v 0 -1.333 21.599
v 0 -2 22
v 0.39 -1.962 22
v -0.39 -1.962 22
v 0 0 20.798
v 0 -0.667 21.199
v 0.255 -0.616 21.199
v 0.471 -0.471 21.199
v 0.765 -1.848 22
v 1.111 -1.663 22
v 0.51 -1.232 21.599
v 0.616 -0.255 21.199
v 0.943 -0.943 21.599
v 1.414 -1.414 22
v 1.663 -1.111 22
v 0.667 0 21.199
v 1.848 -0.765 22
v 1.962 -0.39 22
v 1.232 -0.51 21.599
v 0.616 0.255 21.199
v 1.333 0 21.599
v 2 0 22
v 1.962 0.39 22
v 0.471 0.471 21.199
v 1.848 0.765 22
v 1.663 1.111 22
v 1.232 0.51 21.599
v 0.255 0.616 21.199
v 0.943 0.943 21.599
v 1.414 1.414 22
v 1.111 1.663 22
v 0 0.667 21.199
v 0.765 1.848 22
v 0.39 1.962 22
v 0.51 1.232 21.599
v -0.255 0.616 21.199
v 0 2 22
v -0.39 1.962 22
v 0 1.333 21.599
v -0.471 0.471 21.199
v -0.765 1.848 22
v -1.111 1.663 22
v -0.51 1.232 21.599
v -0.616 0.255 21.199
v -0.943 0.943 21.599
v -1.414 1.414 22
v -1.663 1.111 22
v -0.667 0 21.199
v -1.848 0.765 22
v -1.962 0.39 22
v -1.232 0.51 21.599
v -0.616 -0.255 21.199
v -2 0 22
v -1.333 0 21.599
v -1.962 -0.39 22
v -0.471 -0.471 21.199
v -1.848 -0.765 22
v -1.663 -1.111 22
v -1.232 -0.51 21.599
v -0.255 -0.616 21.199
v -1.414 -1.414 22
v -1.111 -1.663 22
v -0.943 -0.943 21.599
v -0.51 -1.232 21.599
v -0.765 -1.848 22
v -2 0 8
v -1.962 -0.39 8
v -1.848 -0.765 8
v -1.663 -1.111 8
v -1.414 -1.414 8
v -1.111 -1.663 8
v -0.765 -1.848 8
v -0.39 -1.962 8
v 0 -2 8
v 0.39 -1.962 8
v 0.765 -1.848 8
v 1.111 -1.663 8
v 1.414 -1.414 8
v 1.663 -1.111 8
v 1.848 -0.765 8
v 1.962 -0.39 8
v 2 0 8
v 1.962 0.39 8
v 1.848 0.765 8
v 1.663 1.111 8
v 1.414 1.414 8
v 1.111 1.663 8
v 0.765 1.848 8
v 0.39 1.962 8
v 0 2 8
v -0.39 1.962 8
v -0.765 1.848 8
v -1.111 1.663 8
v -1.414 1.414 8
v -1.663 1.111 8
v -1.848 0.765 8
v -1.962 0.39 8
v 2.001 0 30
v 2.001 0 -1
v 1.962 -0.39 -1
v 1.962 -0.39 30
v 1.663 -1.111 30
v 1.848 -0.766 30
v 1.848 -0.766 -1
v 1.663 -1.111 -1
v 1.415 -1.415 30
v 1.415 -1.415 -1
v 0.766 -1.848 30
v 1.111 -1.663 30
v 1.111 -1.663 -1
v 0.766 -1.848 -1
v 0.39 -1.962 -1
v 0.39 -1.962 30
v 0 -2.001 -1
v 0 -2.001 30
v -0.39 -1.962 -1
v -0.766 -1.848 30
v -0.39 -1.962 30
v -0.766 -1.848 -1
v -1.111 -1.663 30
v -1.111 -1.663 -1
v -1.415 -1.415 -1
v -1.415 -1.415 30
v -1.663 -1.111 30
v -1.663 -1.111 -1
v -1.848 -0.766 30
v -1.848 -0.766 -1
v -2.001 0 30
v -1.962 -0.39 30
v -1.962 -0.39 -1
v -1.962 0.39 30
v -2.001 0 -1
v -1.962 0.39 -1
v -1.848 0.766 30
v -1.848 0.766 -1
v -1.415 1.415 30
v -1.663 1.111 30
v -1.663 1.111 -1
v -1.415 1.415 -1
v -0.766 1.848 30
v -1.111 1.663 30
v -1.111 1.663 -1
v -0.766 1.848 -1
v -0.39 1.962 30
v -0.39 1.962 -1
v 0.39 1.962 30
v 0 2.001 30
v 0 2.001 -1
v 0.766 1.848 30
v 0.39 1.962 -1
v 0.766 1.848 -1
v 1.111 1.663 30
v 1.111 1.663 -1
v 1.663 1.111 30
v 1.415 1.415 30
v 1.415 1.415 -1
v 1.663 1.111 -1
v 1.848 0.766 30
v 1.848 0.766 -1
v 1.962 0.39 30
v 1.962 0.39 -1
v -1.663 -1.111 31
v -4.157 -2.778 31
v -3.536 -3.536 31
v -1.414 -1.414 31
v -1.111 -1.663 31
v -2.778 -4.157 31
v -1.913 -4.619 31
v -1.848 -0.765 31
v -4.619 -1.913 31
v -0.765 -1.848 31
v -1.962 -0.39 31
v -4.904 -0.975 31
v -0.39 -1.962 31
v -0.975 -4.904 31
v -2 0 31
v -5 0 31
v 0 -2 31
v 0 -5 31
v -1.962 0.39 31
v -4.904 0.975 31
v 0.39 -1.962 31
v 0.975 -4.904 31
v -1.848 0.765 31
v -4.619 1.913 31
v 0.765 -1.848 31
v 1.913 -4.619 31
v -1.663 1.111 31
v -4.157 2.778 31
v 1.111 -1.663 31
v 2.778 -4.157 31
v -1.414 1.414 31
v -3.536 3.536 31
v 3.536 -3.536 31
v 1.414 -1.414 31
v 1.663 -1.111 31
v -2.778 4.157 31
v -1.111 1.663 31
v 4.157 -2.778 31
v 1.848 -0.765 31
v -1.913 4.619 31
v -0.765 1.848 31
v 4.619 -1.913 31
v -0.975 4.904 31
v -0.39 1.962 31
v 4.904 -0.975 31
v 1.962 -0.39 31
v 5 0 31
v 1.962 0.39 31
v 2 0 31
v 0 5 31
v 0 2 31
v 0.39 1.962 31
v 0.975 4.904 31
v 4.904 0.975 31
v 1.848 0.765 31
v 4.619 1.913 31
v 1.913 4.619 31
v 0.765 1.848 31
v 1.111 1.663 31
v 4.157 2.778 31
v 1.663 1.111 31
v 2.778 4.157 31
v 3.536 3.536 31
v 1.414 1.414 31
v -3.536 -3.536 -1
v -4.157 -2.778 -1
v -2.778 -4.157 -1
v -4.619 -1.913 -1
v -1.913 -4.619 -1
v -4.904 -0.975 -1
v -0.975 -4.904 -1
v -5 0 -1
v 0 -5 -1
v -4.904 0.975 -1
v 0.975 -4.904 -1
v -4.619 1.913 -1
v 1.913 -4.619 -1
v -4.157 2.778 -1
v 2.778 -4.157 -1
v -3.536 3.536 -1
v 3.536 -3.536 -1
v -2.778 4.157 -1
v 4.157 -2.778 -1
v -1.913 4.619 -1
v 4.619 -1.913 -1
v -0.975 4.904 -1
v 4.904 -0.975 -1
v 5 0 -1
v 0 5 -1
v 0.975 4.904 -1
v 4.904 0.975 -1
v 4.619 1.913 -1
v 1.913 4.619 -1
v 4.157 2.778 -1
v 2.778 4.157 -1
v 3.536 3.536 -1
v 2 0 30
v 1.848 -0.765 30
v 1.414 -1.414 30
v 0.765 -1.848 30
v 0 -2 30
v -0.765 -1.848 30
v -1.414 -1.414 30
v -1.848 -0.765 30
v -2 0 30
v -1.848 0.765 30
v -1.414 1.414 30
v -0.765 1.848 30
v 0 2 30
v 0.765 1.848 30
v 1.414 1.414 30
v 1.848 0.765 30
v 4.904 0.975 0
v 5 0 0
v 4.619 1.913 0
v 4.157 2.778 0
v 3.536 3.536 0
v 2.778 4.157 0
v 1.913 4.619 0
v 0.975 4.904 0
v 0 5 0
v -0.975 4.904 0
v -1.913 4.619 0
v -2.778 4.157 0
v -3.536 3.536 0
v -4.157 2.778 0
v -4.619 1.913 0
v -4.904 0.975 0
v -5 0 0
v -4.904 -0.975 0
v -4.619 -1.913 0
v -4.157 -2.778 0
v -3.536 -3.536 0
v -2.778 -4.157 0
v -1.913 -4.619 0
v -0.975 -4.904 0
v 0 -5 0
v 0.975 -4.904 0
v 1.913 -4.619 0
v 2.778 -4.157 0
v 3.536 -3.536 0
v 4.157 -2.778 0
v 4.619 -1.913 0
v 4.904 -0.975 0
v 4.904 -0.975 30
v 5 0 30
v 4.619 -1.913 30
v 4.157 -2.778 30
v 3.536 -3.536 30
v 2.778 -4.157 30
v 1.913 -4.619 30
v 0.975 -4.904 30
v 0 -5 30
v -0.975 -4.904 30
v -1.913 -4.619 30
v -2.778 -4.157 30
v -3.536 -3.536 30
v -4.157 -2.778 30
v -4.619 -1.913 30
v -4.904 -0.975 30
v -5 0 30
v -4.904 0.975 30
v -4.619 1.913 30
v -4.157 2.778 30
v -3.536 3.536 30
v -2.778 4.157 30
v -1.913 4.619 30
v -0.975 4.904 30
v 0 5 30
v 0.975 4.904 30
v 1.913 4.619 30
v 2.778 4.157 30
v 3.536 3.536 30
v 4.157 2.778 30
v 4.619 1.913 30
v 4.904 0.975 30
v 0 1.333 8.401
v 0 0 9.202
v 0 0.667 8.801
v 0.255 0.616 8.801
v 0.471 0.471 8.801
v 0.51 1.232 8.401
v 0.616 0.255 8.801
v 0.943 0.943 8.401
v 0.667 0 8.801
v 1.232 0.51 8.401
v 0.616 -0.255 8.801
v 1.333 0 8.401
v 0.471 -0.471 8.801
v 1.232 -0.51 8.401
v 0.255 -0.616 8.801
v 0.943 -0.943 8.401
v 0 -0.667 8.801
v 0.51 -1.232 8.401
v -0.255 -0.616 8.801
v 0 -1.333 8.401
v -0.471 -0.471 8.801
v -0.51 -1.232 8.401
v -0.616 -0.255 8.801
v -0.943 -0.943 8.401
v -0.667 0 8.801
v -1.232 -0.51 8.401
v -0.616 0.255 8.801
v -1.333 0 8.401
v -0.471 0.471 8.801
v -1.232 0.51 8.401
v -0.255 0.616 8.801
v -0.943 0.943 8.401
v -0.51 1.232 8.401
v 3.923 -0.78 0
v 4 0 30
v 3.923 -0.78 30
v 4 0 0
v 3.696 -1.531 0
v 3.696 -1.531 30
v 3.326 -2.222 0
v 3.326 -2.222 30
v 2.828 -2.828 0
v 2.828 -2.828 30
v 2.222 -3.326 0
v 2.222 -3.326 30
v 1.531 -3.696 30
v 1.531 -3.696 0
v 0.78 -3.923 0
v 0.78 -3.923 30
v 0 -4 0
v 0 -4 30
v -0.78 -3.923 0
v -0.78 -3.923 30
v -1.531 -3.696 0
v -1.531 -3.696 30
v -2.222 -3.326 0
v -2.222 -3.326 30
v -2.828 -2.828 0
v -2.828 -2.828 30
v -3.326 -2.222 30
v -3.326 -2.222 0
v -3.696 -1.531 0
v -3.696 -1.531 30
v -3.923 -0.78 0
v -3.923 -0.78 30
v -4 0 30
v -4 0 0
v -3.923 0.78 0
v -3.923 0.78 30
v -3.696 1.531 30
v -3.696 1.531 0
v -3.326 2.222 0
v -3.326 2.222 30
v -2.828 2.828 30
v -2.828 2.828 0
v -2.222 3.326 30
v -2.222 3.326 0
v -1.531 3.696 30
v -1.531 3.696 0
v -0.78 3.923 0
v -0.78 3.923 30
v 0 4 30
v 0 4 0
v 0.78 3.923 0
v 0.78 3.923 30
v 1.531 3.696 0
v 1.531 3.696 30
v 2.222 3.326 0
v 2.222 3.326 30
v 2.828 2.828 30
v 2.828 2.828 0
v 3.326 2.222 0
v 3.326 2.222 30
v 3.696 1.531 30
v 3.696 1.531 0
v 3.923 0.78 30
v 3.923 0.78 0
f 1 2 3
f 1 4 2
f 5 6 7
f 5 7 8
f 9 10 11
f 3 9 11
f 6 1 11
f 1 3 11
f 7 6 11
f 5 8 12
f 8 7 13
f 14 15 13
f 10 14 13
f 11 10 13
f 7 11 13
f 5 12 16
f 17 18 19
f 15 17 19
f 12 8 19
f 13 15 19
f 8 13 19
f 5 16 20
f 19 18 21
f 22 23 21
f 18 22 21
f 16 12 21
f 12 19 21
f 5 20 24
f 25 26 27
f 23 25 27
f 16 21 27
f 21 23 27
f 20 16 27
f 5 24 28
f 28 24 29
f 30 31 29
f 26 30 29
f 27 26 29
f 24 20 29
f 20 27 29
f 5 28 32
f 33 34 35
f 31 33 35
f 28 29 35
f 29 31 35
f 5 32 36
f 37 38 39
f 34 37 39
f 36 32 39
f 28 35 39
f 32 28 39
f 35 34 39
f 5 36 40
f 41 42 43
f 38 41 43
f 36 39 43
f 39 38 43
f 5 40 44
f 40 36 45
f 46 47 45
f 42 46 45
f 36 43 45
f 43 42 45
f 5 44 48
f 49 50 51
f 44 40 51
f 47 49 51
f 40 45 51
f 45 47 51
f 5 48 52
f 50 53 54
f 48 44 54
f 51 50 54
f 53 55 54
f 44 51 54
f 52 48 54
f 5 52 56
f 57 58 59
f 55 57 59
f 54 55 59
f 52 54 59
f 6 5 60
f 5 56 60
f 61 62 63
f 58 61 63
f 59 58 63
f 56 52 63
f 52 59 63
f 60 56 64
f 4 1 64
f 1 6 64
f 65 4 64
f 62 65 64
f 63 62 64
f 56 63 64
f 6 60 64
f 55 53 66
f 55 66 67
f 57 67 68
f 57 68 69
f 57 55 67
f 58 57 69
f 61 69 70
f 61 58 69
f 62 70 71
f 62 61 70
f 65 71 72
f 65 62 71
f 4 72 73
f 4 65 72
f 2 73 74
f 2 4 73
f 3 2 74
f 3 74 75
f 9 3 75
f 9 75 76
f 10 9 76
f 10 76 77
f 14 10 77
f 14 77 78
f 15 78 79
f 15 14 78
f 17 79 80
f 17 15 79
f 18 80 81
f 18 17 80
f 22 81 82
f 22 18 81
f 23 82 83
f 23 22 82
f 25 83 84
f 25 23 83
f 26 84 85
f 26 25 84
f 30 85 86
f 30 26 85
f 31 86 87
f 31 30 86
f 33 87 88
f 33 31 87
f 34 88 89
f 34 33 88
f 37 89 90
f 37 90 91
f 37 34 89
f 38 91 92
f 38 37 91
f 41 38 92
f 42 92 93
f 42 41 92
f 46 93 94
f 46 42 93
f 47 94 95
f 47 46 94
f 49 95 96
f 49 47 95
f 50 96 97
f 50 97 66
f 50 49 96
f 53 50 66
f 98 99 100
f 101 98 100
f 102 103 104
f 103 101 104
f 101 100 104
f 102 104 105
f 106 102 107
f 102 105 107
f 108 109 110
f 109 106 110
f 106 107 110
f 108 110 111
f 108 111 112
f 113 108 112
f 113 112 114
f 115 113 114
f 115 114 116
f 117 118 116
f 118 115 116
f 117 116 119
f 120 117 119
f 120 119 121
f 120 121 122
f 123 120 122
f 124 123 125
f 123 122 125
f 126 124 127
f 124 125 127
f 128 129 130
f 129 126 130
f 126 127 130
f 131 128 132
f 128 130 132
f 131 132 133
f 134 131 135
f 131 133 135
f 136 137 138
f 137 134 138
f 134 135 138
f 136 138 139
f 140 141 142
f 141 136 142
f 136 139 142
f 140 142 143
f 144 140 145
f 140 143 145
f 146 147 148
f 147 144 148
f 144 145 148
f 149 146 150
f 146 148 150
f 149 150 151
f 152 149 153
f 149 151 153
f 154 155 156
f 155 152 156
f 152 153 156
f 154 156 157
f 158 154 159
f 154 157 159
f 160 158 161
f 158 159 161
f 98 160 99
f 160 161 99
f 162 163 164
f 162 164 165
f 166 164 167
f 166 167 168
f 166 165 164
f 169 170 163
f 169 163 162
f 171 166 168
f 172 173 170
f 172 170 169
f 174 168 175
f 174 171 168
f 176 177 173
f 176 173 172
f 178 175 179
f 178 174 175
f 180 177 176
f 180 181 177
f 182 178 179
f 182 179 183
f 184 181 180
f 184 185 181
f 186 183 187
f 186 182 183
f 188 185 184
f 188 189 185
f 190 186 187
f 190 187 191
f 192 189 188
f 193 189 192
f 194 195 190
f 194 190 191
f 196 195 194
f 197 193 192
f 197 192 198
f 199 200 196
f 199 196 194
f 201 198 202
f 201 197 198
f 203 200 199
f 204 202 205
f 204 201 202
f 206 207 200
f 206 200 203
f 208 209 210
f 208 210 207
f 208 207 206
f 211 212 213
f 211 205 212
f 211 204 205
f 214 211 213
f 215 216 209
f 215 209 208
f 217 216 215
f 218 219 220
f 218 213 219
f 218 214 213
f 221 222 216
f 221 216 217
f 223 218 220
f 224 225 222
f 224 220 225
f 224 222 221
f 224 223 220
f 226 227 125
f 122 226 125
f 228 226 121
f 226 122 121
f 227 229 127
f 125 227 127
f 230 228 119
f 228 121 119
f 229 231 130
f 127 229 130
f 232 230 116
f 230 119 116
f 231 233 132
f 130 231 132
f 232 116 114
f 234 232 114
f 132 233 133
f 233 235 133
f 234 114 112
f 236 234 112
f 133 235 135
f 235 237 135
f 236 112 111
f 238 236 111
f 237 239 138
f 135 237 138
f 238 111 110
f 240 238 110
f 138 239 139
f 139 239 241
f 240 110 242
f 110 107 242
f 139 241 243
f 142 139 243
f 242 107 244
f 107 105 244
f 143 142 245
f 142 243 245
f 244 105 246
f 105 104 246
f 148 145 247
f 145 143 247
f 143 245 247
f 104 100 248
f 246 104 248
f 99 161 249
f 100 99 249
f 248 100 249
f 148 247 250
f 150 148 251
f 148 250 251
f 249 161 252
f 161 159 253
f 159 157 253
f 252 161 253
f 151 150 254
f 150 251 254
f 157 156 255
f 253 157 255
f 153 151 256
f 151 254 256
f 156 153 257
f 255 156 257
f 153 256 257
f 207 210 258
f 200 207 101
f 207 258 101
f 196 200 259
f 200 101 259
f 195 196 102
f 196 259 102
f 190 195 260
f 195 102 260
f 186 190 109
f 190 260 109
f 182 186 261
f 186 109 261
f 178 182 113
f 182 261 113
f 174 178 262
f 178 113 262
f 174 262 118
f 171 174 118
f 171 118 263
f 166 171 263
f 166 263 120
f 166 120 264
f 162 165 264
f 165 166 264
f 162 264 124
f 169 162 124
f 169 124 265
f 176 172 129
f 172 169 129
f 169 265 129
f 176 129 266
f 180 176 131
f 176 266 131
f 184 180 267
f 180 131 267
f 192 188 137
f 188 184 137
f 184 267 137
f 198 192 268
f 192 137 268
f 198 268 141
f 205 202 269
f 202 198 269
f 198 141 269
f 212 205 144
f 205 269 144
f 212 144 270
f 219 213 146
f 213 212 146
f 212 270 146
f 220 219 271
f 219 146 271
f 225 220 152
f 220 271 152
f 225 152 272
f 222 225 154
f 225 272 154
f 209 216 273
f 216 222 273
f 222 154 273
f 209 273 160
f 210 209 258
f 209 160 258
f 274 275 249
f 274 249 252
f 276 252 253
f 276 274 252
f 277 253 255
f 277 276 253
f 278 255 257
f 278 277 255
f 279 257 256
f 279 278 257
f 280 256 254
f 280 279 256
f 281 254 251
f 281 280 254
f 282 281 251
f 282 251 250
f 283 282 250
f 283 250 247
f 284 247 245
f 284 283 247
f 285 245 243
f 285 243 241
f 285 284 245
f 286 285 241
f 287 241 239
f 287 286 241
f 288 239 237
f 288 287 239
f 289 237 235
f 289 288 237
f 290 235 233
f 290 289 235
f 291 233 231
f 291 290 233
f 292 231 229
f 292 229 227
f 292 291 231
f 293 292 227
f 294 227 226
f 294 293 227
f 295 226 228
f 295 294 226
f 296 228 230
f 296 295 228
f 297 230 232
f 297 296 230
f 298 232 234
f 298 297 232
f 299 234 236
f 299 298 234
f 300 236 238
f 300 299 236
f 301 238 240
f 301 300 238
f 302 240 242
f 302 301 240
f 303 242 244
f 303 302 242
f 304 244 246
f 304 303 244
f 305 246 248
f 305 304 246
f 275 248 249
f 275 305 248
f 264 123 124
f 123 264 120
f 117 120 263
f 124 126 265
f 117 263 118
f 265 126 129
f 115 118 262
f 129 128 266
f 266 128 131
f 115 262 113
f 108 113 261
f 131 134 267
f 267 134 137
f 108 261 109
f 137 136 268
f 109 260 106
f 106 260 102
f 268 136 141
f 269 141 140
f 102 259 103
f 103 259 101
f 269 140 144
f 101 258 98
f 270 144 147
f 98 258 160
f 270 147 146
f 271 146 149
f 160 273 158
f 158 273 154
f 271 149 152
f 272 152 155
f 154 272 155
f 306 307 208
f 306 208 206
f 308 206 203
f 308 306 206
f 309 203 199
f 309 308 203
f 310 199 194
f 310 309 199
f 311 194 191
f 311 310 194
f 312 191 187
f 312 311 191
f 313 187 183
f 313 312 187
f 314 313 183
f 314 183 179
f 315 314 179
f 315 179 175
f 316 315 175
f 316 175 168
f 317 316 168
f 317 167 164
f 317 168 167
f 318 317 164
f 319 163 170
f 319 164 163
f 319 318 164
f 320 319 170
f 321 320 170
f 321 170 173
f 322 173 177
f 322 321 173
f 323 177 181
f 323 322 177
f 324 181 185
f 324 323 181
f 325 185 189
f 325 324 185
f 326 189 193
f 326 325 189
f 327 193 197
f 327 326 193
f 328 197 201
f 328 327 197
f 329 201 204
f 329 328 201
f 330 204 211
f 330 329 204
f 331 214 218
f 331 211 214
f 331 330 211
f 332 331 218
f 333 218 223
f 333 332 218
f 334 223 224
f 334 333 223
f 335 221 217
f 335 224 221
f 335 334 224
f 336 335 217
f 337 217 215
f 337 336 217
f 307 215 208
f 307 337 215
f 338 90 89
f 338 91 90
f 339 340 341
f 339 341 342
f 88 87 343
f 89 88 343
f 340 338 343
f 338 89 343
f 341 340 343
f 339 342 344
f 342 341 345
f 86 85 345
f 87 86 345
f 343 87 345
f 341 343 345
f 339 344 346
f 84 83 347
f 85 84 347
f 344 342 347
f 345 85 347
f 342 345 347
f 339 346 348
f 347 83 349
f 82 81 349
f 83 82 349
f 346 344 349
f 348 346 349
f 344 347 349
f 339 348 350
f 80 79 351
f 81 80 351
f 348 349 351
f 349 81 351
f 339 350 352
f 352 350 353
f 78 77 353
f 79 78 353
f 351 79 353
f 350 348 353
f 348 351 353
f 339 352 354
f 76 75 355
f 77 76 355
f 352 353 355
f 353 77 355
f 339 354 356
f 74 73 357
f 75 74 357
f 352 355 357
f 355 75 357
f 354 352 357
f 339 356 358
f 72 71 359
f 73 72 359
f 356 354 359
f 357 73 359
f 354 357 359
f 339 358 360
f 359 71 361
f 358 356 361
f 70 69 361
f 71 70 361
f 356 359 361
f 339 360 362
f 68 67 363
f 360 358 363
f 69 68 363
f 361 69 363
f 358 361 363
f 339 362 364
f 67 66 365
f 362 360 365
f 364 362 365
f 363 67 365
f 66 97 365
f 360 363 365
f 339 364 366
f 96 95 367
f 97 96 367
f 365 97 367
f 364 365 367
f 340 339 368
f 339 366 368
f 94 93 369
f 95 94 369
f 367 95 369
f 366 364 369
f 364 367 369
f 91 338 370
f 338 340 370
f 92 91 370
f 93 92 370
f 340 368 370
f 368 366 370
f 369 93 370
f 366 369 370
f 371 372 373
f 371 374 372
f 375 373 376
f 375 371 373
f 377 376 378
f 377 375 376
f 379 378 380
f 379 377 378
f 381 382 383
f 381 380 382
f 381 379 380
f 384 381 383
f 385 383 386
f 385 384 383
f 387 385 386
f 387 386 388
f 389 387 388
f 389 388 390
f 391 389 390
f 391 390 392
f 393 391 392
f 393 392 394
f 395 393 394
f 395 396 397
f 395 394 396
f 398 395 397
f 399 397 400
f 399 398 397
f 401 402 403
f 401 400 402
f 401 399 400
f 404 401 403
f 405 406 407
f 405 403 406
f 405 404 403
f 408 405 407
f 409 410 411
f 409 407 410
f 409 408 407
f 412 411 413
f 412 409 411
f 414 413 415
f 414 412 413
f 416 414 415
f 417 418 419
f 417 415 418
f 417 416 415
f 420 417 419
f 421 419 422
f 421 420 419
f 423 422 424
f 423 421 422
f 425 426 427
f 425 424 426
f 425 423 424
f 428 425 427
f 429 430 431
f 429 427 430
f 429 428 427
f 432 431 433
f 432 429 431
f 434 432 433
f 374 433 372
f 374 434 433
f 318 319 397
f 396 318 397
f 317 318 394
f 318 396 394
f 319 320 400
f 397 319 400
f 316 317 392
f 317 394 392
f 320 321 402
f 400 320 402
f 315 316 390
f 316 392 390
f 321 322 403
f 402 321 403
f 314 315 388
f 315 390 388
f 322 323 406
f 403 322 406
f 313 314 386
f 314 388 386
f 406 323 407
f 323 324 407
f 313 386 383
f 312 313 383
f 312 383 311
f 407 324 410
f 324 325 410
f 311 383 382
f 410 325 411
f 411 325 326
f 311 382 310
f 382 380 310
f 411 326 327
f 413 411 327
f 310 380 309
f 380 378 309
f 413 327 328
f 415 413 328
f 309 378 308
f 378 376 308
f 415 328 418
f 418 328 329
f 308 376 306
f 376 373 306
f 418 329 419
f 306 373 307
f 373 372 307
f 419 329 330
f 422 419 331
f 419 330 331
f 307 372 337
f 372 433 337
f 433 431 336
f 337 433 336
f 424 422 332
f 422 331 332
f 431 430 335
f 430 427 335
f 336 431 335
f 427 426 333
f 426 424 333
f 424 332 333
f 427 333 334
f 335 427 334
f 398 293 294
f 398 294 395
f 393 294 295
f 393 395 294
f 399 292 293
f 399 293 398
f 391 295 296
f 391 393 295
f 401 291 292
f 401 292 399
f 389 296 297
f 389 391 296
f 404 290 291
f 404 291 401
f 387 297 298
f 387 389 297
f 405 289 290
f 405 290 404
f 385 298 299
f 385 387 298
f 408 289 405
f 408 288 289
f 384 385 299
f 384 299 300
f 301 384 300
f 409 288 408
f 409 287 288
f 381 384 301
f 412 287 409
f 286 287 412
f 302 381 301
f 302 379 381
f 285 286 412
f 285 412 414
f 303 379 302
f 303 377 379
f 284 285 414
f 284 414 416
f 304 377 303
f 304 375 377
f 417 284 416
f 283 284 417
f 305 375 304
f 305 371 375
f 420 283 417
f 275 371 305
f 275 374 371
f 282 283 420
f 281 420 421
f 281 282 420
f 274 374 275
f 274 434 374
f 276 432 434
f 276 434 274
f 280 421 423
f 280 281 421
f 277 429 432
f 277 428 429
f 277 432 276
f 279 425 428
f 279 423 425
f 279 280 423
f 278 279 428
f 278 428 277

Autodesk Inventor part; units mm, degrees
ref_plane "YZ Plane" through (0, 0, 0) normal (1, 0, 0) x (0, 1, 0)
ref_plane "XZ Plane" through (0, 0, 0) normal (0, 1, 0) x (-1, 0, 0)
ref_plane "XY Plane" through (0, 0, 0) normal (0, 0, 1) x (1, 0, 0)
sketch "スケッチ1" plane through (0, 0, 0) normal (0, 0, 1) x (1, 0, 0)
  circle A0 centre (0, 0) radius 4
  circle A1 centre (0, 0) radius 2.0005
  circle A2 centre (0, 0) radius 5
  dimension "d0" = 8
  dimension "d1" = 4.001
  dimension "d2" = 10
extrude "押し出し1" add sketch "スケッチ1" along normal blind 30 contours A0
extrude "押し出し2" add sketch "スケッチ1" against normal blind 1 contours A0 | A2
sketch "スケッチ2" plane through (0, 0, 30) normal (0, 0, 1) x (1, 0, 0)
  circle A0 centre (0, 0) radius 5
  circle A1 centre (0, 0) radius 2
  dimension "d7" = 10
extrude "押し出し3" add sketch "スケッチ2" along normal blind 1
sketch "スケッチ3" plane through (0, 0, 30) normal (0, 0, -1) x (-1, 0, 0)
  circle A0 centre (0, 0) radius 2
  dimension "d10" = 4
extrude "押し出し4" add sketch "スケッチ3" along normal blind 30
hole "穴1" at (0, 0, 30) direction (0, 0, -1) diameter 4 depth 8 tip angle 118
hole "穴2" at (0, 0, 0) direction (0, 0, 1) diameter 4 depth 8 tip angle 118
properties part number "スペーサー　m4-32(ワッシャー1×2)" material "アルミニウム 2014-T4"
